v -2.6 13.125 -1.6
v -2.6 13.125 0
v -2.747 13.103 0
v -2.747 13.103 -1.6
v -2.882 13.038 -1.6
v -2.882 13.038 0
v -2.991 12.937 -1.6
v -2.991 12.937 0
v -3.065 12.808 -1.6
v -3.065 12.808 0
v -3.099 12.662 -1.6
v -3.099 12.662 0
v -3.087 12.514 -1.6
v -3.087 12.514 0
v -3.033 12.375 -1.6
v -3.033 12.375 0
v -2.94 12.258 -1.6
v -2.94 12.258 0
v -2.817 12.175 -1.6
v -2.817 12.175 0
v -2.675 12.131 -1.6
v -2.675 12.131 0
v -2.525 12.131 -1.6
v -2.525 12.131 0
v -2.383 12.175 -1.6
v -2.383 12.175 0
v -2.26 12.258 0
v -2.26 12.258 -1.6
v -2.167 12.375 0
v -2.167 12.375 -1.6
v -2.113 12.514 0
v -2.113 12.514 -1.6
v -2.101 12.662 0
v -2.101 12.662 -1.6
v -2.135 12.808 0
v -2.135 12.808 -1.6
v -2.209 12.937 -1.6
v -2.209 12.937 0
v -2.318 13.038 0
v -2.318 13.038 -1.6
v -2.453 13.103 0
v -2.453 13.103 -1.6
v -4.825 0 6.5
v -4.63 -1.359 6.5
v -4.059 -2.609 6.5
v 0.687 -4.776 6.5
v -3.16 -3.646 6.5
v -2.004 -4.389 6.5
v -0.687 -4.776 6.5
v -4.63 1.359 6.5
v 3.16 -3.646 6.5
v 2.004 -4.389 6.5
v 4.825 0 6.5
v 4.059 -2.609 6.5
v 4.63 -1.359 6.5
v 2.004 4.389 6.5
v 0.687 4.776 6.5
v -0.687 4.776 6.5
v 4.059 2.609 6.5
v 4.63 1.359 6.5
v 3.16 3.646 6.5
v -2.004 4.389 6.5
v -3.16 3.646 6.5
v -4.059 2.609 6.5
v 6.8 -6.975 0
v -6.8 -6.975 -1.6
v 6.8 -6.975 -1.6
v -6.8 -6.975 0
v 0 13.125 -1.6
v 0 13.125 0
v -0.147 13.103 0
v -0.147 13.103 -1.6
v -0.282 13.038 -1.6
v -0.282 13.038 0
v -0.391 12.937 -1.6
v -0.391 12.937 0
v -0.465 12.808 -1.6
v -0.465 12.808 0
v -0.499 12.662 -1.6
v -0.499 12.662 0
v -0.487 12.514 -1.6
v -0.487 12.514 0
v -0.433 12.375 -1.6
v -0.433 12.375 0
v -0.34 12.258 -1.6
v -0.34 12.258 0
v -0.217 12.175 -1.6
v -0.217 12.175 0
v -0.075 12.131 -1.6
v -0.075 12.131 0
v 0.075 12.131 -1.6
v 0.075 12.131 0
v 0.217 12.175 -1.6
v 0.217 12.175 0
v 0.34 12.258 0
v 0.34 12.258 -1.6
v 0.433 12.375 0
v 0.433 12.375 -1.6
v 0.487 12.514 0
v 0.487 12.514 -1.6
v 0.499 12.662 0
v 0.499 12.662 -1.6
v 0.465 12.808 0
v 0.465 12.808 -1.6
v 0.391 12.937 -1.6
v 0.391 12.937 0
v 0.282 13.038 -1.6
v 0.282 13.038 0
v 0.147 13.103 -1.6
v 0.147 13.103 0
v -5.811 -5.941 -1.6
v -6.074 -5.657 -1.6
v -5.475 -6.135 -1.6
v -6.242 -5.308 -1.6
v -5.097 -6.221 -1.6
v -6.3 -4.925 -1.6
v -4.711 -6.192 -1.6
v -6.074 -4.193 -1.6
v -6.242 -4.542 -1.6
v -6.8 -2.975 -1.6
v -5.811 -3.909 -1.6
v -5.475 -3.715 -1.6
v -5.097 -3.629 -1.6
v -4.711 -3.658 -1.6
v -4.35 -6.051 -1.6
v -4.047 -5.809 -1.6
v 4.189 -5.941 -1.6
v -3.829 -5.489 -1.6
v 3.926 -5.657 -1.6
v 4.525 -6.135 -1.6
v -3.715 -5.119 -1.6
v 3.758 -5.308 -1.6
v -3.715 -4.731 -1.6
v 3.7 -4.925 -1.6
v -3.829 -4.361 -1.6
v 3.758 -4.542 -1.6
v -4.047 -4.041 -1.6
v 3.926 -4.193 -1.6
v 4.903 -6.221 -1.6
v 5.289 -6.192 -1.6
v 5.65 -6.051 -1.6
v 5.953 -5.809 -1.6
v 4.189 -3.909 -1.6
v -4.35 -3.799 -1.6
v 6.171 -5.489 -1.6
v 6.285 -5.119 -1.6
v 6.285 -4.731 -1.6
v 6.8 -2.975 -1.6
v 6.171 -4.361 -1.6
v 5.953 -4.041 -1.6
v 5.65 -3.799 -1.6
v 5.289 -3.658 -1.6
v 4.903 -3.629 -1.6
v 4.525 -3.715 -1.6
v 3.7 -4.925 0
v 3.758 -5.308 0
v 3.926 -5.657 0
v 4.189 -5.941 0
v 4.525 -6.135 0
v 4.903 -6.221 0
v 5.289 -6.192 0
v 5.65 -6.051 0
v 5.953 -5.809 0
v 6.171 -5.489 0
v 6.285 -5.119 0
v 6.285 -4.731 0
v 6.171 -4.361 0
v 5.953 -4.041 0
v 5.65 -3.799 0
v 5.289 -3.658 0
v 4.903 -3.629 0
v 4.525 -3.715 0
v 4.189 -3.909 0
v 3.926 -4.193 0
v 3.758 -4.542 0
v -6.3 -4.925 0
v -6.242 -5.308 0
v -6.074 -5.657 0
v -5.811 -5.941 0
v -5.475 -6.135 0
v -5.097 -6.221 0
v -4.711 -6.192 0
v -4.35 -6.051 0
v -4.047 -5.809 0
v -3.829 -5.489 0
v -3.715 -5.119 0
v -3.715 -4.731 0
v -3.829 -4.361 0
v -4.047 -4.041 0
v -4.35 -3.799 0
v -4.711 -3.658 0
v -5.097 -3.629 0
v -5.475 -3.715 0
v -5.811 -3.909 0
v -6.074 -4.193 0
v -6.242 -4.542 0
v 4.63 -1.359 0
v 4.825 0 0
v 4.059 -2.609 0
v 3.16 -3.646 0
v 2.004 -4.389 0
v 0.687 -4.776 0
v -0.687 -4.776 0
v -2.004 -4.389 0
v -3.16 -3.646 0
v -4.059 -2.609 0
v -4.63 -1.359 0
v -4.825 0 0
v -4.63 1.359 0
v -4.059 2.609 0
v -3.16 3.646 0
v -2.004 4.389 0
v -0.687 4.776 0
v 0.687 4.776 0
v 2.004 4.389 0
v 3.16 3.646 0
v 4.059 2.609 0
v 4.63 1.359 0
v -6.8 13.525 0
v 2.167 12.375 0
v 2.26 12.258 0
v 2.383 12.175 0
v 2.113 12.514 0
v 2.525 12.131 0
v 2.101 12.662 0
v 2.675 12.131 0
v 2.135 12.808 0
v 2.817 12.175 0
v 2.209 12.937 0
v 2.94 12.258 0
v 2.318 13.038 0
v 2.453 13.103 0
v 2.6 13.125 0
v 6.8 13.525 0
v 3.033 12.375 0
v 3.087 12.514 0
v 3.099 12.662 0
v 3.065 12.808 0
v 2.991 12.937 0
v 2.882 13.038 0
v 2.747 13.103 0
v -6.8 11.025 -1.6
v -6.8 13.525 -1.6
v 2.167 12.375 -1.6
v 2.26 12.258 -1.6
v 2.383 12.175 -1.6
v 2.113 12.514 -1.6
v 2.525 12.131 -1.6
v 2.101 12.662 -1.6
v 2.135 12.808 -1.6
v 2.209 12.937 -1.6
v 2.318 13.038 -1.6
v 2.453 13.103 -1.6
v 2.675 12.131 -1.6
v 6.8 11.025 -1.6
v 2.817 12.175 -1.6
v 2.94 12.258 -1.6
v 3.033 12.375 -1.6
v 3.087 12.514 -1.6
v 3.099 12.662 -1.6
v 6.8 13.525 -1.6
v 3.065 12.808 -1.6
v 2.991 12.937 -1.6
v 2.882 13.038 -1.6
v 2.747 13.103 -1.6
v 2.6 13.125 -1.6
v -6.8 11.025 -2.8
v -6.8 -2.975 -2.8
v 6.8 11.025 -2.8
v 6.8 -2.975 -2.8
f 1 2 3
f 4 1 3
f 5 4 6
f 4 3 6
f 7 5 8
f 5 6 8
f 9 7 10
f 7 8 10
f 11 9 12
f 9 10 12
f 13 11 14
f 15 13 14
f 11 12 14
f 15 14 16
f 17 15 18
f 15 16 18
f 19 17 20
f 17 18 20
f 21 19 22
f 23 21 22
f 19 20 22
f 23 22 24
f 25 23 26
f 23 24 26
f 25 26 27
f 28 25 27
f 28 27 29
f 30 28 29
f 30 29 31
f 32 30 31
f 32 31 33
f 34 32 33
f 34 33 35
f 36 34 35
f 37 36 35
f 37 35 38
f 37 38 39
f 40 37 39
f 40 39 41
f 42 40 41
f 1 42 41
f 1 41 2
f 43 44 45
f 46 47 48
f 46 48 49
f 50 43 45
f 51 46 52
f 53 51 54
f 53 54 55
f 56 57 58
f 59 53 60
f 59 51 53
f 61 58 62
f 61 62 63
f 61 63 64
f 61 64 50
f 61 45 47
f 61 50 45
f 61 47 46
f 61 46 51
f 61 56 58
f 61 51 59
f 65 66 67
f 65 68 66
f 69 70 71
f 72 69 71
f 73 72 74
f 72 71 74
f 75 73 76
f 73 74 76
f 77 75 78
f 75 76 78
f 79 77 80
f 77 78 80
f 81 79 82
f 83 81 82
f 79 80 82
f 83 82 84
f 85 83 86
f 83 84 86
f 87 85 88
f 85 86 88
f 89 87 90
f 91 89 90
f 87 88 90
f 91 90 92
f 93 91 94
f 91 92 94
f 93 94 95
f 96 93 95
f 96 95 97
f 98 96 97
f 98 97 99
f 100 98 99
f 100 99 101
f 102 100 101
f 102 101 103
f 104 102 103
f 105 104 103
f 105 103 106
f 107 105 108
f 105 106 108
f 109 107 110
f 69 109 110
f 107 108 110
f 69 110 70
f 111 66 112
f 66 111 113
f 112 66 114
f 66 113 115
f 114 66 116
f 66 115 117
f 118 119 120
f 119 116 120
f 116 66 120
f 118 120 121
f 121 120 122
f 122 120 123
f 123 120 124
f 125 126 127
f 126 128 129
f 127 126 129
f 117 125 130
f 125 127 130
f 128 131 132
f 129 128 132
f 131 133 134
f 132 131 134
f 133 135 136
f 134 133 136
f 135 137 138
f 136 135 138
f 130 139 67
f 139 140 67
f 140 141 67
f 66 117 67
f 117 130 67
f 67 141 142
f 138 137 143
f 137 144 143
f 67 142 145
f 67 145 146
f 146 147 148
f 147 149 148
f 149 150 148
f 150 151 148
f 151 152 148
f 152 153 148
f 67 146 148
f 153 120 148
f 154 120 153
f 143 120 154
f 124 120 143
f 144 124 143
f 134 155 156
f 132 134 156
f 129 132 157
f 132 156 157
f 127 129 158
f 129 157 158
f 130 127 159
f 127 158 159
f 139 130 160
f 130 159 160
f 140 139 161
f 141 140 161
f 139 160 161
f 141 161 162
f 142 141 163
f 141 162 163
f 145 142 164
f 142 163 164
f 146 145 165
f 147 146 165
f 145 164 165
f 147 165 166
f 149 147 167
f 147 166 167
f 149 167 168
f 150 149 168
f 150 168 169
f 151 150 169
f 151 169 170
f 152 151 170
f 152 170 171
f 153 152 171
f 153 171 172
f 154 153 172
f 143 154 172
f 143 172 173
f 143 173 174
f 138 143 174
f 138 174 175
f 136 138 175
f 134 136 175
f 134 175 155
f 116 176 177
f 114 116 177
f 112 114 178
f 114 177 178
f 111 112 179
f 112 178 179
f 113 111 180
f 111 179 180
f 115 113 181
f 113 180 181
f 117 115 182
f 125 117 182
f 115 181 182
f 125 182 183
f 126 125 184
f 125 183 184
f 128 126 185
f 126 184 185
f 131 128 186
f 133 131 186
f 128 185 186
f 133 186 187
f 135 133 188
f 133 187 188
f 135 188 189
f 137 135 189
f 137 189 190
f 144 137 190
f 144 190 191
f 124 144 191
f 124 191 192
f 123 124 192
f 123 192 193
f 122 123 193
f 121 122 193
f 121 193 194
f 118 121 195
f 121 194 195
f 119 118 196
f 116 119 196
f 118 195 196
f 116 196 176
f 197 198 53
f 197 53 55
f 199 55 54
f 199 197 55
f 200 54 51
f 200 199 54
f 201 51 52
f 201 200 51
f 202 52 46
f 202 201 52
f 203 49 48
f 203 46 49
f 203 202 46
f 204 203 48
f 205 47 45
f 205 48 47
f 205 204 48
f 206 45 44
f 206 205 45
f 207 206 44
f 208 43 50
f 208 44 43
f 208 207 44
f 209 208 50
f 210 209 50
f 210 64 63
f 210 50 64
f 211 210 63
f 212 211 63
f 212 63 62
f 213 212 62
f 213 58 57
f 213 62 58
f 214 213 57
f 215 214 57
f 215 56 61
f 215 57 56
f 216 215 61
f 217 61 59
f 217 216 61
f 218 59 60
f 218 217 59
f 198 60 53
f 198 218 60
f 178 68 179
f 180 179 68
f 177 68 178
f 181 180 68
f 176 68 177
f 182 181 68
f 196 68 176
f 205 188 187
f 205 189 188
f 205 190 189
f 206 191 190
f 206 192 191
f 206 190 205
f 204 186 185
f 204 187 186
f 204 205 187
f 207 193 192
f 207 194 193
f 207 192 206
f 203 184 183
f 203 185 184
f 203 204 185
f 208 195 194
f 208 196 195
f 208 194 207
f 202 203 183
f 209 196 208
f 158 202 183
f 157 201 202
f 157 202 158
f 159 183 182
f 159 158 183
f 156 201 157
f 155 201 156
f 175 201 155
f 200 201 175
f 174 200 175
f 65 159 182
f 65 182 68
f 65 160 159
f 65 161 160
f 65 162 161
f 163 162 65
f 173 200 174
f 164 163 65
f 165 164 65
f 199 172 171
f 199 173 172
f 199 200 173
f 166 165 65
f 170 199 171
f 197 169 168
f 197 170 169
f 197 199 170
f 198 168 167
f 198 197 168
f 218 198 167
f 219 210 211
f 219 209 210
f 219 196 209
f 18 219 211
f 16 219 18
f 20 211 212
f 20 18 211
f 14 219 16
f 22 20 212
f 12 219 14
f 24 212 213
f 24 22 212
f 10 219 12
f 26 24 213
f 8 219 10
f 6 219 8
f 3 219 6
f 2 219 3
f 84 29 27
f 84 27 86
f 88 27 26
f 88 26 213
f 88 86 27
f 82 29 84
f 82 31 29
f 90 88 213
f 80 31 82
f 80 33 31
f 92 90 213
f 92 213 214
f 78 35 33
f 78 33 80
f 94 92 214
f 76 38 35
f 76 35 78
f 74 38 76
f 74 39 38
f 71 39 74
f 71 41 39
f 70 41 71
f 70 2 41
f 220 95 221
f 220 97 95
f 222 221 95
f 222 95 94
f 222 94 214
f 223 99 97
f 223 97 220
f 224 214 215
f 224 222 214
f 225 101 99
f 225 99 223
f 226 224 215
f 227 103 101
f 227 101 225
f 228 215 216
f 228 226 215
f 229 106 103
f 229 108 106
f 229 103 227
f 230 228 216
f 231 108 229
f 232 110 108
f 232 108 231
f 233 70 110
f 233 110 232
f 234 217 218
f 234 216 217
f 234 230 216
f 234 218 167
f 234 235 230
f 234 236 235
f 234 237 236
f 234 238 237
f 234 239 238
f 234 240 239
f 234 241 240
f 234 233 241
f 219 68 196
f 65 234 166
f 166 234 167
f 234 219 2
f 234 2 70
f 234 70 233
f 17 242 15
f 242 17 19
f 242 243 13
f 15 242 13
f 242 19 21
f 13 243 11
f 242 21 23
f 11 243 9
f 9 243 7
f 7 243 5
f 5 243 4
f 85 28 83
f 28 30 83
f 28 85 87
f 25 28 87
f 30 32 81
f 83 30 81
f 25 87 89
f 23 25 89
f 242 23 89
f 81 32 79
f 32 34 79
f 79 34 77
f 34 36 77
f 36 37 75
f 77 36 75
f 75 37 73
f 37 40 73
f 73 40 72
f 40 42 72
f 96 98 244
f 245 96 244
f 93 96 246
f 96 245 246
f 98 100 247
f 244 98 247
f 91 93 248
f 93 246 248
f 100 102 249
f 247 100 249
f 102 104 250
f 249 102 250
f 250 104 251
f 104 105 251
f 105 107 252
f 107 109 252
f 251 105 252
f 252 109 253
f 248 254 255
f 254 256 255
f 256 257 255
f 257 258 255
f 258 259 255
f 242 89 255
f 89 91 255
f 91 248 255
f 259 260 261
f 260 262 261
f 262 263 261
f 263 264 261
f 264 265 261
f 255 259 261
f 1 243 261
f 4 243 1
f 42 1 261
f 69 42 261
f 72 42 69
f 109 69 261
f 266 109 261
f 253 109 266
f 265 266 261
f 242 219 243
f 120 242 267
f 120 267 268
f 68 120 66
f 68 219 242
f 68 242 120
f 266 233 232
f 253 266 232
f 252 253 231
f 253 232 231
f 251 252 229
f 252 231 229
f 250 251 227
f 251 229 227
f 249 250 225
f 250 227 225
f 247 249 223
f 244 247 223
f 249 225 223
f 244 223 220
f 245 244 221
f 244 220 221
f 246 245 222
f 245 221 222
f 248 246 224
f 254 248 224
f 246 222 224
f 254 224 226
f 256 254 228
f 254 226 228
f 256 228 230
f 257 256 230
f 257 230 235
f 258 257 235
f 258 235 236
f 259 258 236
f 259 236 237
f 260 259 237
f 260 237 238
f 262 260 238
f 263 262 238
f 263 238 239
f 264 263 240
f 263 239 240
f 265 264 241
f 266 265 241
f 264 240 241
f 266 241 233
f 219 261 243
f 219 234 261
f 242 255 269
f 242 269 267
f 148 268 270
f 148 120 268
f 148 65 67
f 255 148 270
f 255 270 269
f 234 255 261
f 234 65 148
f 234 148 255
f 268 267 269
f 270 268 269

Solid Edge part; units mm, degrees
sketch "Sketch1" plane through (0, 0, 0) normal (0, 0, 1) x (1, 0, 0)
  circle A0 centre (0, 0) radius 4.825
  dimension "D1" = 9.65
extrude "Protrusion1" add sketch "Sketch1" along normal blind 6.5
sketch "Sketch2" plane through (0, 0, 0) normal (0, 0, -1) x (1, 0, 0)
  line L0 (-6.8, 6.975) -> (6.8, 6.975)
  line L1 (6.8, 6.975) -> (6.8, -13.525)
  line L2 (6.8, -13.525) -> (-6.8, -13.525)
  line L3 (-6.8, -13.525) -> (-6.8, 6.975)
  dimension "D1" = 13.6
  dimension "D2" = 20.5
  dimension "D3" = 11.8
extrude "base" add sketch "Sketch2" along normal blind 1.6
sketch "Sketch3" plane through (0, 3.275, 0) normal (0, 0, 1) x (0, 1, 0)
  circle A0 centre (9.35, 2.6) radius 0.5
  circle A1 centre (9.35, 0) radius 0.5
  circle A2 centre (9.35, -2.6) radius 0.5
  dimension "D1" = 1
  dimension "D2" = 2.6
  dimension "D3" = 0.9
extrude "Cutout1" cut sketch "Sketch3" against normal through all
sketch "Sketch4" plane through (0, 3.275, 0) normal (0, 0, 1) x (-1, 0, 0)
  circle A0 centre (5, 8.2) radius 1.3
  circle A1 centre (-5, 8.2) radius 1.3
  dimension "D1" = 2.6
  dimension "D2" = 0.5
  dimension "D3" = 0.75
  dimension "D4" = 0.5
  dimension "D5" = 0.75
extrude "Cutout2" cut sketch "Sketch4" against normal through all
sketch "Sketch5" plane through (0, 3.275, -1.6) normal (0, 0, -1) x (1, 0, 0)
  line L0 (-6.8, 6.25) -> (6.8, 6.25)
  line L1 (6.8, 6.25) -> (6.8, -7.75)
  line L2 (6.8, -7.75) -> (-6.8, -7.75)
  line L3 (-6.8, -7.75) -> (-6.8, 6.25)
  dimension "D1" = 2.5
  dimension "D2" = 4
extrude "Extrusionsausprägung_3" add sketch "Sketch5" along normal blind 1.2
